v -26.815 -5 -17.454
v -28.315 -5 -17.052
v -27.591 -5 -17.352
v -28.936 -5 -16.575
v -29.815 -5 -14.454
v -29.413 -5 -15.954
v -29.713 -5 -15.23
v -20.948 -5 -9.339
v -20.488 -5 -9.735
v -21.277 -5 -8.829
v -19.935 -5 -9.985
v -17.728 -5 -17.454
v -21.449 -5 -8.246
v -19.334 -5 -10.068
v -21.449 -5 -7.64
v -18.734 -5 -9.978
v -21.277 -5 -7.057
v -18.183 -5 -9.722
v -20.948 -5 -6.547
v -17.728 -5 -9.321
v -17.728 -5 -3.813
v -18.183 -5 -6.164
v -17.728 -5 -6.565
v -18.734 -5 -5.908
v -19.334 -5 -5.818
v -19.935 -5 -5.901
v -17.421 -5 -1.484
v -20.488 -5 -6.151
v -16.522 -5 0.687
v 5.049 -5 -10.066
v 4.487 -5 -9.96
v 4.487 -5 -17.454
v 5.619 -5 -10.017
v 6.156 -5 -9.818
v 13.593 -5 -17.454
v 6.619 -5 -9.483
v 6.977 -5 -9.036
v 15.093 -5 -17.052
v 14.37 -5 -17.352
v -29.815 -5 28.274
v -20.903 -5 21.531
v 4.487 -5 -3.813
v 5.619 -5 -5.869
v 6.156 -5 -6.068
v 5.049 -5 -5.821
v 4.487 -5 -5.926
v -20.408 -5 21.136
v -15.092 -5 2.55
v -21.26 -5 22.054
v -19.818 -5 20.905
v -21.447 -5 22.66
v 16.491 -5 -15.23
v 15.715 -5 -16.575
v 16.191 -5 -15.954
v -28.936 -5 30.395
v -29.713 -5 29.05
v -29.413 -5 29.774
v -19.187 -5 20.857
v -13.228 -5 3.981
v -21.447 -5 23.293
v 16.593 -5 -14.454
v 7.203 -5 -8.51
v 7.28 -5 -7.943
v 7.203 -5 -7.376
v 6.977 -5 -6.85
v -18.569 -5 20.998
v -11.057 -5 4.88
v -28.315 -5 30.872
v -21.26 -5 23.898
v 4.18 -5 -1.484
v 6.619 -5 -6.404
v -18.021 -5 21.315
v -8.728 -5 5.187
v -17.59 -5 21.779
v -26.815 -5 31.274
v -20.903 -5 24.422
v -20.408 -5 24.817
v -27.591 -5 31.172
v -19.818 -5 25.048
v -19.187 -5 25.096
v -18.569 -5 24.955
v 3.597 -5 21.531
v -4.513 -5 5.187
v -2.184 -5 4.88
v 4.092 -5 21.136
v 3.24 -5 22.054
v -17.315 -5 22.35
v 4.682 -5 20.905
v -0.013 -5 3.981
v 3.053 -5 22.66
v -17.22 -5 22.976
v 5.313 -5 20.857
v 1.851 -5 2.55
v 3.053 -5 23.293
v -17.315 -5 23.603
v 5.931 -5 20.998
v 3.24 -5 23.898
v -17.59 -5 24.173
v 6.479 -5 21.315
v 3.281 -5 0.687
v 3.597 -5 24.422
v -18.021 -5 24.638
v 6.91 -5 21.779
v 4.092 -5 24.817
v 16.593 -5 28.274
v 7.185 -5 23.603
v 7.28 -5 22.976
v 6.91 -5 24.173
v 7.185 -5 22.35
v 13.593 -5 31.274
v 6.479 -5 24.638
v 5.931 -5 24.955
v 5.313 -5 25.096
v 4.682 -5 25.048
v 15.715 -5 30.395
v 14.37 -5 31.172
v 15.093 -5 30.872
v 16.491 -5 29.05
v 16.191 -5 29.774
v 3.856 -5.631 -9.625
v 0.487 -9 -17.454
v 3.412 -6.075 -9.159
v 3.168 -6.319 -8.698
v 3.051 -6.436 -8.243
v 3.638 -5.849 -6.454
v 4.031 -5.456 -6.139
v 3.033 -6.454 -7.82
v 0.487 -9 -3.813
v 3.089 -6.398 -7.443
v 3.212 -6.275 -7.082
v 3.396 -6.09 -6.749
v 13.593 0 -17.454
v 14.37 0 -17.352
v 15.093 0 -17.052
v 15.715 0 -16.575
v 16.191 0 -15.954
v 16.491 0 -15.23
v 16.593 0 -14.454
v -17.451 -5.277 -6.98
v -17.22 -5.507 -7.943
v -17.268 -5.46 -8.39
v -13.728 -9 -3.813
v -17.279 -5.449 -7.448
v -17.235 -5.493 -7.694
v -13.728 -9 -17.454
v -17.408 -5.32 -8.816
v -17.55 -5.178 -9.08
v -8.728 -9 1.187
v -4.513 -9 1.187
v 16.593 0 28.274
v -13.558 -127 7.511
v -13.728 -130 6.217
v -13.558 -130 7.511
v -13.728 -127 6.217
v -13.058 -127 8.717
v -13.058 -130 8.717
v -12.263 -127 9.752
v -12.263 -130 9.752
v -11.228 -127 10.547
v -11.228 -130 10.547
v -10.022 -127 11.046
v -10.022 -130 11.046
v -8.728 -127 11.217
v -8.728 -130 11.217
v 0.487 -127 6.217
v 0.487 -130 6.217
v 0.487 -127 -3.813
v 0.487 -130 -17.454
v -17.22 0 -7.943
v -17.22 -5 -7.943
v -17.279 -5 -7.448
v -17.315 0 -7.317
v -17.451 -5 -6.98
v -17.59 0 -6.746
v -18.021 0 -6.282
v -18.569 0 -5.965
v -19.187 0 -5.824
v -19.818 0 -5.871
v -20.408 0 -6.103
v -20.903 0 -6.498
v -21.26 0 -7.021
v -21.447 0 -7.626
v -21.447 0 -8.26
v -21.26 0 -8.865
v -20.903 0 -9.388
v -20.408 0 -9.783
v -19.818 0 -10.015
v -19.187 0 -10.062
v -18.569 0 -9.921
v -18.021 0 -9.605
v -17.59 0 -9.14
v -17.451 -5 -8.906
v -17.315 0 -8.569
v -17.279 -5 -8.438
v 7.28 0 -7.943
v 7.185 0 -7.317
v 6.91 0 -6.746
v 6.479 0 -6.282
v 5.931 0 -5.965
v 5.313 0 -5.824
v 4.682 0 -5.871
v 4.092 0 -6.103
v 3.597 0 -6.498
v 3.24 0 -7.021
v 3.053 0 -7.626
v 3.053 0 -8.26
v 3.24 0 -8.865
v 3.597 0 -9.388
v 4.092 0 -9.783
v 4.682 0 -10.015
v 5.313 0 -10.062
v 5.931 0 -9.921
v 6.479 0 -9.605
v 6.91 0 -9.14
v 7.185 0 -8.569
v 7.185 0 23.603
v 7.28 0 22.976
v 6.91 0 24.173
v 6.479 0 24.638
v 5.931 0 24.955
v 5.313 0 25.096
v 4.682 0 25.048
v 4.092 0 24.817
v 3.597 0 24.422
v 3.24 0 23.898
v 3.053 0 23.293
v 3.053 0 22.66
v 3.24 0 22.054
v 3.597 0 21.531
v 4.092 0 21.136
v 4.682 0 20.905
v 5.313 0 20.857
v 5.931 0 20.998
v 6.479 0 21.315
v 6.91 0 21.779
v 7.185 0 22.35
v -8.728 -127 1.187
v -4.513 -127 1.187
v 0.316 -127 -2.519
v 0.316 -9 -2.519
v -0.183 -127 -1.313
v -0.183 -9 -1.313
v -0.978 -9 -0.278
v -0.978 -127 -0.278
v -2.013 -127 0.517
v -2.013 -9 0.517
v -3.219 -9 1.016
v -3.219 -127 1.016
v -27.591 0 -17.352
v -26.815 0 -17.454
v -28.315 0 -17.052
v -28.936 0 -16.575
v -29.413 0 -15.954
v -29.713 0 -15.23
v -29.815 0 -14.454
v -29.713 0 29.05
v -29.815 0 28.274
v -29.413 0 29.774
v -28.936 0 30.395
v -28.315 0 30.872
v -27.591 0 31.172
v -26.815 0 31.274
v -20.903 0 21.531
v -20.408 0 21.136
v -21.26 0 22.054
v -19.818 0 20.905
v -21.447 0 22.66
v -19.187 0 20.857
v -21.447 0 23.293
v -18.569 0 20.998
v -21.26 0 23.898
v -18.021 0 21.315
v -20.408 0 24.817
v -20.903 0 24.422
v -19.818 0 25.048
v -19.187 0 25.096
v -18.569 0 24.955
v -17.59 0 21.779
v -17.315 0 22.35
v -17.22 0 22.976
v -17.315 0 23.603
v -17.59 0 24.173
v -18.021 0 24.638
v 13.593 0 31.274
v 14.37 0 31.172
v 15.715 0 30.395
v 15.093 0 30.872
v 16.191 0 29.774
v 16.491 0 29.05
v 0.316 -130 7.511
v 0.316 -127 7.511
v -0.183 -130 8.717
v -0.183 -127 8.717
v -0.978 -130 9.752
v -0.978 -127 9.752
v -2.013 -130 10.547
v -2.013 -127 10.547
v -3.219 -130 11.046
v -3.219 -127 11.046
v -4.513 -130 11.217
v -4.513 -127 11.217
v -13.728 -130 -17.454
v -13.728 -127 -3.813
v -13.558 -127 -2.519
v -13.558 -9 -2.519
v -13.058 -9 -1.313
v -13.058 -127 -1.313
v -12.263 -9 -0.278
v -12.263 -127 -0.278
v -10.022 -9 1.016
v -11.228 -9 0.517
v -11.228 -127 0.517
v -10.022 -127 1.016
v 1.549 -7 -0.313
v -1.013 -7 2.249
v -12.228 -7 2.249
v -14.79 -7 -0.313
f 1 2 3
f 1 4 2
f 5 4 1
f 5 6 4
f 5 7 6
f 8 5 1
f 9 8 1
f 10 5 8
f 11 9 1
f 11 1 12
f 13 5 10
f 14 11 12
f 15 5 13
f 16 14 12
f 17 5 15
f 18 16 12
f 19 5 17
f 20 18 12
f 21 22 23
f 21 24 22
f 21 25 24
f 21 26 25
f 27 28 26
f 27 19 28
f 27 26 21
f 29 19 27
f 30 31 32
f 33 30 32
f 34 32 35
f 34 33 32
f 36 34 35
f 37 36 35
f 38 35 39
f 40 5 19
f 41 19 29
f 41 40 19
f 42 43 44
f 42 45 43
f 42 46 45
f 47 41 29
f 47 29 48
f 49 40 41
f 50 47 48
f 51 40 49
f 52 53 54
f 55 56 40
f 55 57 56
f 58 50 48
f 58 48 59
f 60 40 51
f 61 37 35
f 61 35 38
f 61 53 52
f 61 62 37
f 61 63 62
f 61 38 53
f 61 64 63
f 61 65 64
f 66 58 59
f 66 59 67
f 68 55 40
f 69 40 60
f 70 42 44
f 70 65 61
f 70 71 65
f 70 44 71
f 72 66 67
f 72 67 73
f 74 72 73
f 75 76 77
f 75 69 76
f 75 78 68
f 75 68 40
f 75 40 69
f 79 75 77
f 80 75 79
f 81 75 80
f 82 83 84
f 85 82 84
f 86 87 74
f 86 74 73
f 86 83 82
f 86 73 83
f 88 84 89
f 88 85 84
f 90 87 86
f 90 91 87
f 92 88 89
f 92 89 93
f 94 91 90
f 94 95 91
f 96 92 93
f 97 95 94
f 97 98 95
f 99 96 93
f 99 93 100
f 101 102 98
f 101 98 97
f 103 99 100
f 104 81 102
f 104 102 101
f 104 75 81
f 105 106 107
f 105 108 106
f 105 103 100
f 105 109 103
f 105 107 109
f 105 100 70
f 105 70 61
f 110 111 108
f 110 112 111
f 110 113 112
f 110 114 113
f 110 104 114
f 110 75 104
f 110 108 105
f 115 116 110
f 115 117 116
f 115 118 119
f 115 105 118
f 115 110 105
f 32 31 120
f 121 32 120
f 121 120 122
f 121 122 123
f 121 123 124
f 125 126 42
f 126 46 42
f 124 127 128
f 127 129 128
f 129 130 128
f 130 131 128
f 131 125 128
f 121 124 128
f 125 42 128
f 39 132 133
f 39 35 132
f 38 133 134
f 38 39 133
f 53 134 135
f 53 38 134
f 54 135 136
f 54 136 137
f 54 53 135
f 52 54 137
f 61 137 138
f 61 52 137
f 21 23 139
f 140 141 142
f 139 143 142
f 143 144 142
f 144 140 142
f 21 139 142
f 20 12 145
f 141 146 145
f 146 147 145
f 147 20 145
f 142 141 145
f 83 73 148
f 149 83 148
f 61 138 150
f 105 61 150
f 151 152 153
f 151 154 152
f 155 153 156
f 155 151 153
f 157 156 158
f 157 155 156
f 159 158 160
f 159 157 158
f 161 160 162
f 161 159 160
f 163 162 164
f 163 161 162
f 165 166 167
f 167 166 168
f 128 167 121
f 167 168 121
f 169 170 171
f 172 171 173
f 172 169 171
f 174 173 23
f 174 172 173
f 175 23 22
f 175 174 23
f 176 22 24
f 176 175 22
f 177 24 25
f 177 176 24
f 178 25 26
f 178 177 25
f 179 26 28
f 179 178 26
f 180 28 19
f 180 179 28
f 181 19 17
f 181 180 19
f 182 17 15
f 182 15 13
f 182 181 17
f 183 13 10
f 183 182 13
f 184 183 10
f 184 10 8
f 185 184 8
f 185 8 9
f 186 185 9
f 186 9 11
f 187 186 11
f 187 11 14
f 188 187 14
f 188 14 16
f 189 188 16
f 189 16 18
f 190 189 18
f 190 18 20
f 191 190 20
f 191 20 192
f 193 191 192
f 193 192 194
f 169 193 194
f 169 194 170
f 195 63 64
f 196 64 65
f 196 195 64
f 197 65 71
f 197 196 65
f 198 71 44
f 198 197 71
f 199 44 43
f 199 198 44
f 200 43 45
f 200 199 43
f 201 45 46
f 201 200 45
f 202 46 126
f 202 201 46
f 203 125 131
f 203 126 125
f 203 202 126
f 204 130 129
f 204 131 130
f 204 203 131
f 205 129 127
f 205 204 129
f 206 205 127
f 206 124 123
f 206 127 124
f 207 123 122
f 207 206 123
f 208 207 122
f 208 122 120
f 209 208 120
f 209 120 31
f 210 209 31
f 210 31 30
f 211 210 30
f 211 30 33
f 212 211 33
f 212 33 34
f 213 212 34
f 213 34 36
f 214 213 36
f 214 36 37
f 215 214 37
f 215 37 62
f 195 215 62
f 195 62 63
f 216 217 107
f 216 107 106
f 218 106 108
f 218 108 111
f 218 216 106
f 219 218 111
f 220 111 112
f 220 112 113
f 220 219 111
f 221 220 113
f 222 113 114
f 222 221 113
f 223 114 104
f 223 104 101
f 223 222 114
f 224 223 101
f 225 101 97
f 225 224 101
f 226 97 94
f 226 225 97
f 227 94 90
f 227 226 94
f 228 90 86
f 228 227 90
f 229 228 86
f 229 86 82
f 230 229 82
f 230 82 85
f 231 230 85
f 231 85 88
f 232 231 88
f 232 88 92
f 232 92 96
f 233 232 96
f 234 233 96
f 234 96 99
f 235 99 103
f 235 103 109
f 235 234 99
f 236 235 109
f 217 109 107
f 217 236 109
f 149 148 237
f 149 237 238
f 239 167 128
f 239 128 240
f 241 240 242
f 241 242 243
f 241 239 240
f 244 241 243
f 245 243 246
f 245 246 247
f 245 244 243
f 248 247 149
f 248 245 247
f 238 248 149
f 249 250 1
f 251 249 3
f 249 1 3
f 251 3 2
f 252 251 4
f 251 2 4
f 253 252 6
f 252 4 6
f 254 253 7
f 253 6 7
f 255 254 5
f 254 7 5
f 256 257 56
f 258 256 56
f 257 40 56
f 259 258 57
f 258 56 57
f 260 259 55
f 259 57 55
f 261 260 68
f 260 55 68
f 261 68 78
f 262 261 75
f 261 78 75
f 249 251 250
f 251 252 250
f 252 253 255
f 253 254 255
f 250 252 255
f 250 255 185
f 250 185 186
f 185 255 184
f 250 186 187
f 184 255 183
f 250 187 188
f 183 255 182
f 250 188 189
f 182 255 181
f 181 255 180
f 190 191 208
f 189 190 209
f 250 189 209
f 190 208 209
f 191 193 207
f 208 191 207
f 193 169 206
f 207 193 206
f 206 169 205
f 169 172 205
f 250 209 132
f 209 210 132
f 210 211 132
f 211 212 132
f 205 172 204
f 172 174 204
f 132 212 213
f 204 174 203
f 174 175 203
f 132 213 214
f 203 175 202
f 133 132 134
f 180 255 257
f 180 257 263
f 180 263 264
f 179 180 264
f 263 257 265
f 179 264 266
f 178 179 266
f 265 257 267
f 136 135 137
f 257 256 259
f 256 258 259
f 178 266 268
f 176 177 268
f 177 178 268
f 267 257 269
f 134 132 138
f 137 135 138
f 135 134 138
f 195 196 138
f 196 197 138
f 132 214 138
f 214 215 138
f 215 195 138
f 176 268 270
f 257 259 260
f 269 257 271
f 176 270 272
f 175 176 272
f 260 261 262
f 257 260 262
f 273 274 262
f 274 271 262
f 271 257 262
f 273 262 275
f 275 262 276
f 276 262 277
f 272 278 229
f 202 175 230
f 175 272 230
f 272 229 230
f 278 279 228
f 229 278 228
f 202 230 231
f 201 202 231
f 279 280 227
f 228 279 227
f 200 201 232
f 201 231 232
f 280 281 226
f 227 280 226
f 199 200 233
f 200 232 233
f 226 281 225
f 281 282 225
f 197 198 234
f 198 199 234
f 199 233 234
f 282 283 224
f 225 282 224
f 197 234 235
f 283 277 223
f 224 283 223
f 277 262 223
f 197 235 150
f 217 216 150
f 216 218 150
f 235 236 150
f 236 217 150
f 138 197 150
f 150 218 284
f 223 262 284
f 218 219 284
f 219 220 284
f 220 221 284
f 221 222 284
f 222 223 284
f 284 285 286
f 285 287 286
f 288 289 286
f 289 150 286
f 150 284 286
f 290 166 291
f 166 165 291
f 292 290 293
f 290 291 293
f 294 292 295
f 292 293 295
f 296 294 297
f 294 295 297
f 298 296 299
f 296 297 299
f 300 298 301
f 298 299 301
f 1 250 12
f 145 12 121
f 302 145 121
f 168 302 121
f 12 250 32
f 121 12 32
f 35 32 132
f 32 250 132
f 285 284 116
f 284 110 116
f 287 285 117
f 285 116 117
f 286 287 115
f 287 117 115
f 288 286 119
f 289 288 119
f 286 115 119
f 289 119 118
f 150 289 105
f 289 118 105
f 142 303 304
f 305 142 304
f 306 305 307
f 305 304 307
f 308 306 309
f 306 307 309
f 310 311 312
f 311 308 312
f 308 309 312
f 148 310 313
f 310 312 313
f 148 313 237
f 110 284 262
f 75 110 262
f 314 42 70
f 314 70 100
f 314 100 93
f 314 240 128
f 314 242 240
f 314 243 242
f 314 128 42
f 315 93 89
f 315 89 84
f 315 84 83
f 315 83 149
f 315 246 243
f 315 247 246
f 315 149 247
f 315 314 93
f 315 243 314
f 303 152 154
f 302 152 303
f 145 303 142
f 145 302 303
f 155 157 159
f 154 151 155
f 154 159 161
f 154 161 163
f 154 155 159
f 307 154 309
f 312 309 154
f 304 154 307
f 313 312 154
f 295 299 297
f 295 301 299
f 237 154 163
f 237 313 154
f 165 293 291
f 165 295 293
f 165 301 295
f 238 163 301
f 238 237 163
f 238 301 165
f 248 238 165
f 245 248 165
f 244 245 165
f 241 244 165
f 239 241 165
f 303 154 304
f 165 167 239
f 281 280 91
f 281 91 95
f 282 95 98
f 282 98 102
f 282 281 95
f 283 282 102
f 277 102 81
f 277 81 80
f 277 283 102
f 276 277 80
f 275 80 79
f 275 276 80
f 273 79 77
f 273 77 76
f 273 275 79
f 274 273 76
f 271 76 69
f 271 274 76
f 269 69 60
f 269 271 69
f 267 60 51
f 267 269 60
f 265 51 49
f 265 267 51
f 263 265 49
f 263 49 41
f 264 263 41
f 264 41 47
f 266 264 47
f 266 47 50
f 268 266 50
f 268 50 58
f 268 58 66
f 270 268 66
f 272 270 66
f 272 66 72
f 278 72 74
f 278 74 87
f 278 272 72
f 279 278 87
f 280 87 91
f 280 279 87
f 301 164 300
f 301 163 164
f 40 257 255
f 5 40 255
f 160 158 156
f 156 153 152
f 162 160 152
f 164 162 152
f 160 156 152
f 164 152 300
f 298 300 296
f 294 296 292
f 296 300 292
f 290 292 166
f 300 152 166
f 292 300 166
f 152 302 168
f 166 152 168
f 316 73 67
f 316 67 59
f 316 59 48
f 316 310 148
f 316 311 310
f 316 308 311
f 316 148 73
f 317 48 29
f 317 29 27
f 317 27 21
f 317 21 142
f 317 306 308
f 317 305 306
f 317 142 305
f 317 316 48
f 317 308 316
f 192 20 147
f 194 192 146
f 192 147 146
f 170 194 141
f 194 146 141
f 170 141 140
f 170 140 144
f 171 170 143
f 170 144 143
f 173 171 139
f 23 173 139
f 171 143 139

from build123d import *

# Parameters (mm, degrees)
F0_R         = 2.1251138046
F1_DEPTH     = 5
F0_W         = 14.2144468555
F0_H         = 18.6405025888
F2_DEPTH     = 130
F3_W         = 14.2144468555
F3_H         = 3
F4_DEPTH     = 10.03026
F5_R         = 5
F6_R         = 3
F7_T1_DEPTH  = 4.2144468555
F7_T6_DEPTH  = 13.6405025888
F7_S7_R      = 2.1251138046
F7_T8_DEPTH  = 9
F7_T10_ANGLE = 90
F7_T12_ANGLE = 90
F7_T16_DEPTH = 13.6405025888
F7_S17_R     = 2.1251138046
F7_T18_DEPTH = 9


# Not quite as in the source:
# - a fillet or chamfer that OpenCascade refuses, or shapes differently, is made with other operations: its cross-section is extruded or revolved along the edge and cut away or added


with BuildPart() as f1:
    # F0 (on Front) → F1 (new body)
    with BuildSketch(Plane.XZ):
        Polygon((16.5932904929, 31.273946166), (-29.8148933798, 31.273946166), (-29.8148933798, -17.4539741129), (-13.7278847396, -17.4539741129), (-13.7278847396, 1.186528476), (0.4865621158, 1.186528476), (0.4865621158, -17.4539741129), (16.5932904929, -17.4539741129), align=None)
        with Locations((-19.3455703557, -7.9430211366)):
            Circle(F0_R, mode=Mode.SUBTRACT)
        with Locations((5.1544296443, -7.9430211366)):
            Circle(F0_R, mode=Mode.SUBTRACT)
        with Locations((-19.3455703557, 22.9763388634)):
            Circle(F0_R, mode=Mode.SUBTRACT)
        with Locations((5.1544296443, 22.9763388634)):
            Circle(F0_R, mode=Mode.SUBTRACT)
    extrude(amount=F1_DEPTH)

    # F0 (on Front) → F2 (join)
    with BuildSketch(Plane.XZ):
        with Locations((-6.6206613119, -8.1337228185)):
            Rectangle(F0_W, F0_H)
    extrude(amount=F2_DEPTH)

    # F3 (on face) → F4 (join)
    with BuildSketch(Plane.XY.offset(1.186528476)):
        with Locations((-6.6206613119, -128.5)):
            Rectangle(F3_W, F3_H)
    extrude(amount=F4_DEPTH)

    # F5
    f5_edges = [f1.edges().sort_by_distance(p)[0] for p in [
        (0.486562, -66, 1.186528),
        (-13.727885, -66, 1.186528),
        (-13.727885, -128.5, 11.216788),
        (0.486562, -128.5, 11.216788),
    ]]
    fillet(f5_edges, radius=F5_R)

    # F6
    f6_edges = [f1.edges().sort_by_distance(p)[0] for p in [
        (-29.814893, -2.5, 31.273946),
        (16.59329, -2.5, 31.273946),
        (-29.814893, -2.5, -17.453974),
        (16.59329, -2.5, -17.453974),
    ]]
    fillet(f6_edges, radius=F6_R)

    # F7: chamfer of 4 on 2 edges, made by hand

    # F7_s2 → F7_t1 (join)
    with BuildSketch(Plane.YZ.offset(-8.7278847396)):
        Polygon((-5, 5.186528476), (-9, 1.186528476), (-5, 1.186528476), align=None)
    extrude(amount=F7_T1_DEPTH)


with BuildPart() as f7_tool4:
    # F7_s5 → F7_t6 (new body)
    with BuildSketch(Plane.XY.offset(-3.813471524)):
        Polygon((4.4865621158, -5), (0.4865621158, -9), (0.4865621158, -5), align=None)
    extrude(amount=-F7_T6_DEPTH)

    # F7_s7 → F7_t8 (cut, symmetric)
    with BuildSketch(Plane.XZ.offset(7)):
        with Locations((5.1544296443, -7.9430211366)):
            Circle(F7_S7_R)
    extrude(amount=F7_T8_DEPTH, both=True, mode=Mode.SUBTRACT)


with BuildPart() as f1_1:
    add(f1.part)

    # F7_t3: union F7_tool4
    add(f7_tool4.part)

    # F7_s9 → F7_t10 (revolve)
    with BuildSketch(Plane.XY.offset(-3.813471524)):
        Polygon((4.4865621158, -5), (0.4865621158, -9), (0.4865621158, -5), align=None)
    revolve(axis=Axis((-4.5134378842, -5, -3.813471524), (0, -1, 0)), revolution_arc=F7_T10_ANGLE)

    # F7_s11 → F7_t12 (revolve)
    with BuildSketch(Plane.YZ.offset(-8.7278847396)):
        Polygon((-5, 5.186528476), (-9, 1.186528476), (-5, 1.186528476), align=None)
    revolve(axis=Axis((-8.7278847396, -5, -3.813471524), (0, -1, 0)), revolution_arc=F7_T12_ANGLE)


with BuildPart() as f7_tool14:
    # F7_s15 → F7_t16 (new body)
    with BuildSketch(Plane.XY.offset(-17.4539741129)):
        Polygon((-17.7278847396, -5), (-13.7278847396, -9), (-13.7278847396, -5), align=None)
    extrude(amount=F7_T16_DEPTH)

    # F7_s17 → F7_t18 (cut, symmetric)
    with BuildSketch(Plane.XZ.offset(7)):
        with Locations((-19.3455703557, -7.9430211366)):
            Circle(F7_S17_R)
    extrude(amount=F7_T18_DEPTH, both=True, mode=Mode.SUBTRACT)


with BuildPart() as f1_2:
    add(f1_1.part)

    # F7_t13: union F7_tool14
    add(f7_tool14.part)


solid = f1_2.part
